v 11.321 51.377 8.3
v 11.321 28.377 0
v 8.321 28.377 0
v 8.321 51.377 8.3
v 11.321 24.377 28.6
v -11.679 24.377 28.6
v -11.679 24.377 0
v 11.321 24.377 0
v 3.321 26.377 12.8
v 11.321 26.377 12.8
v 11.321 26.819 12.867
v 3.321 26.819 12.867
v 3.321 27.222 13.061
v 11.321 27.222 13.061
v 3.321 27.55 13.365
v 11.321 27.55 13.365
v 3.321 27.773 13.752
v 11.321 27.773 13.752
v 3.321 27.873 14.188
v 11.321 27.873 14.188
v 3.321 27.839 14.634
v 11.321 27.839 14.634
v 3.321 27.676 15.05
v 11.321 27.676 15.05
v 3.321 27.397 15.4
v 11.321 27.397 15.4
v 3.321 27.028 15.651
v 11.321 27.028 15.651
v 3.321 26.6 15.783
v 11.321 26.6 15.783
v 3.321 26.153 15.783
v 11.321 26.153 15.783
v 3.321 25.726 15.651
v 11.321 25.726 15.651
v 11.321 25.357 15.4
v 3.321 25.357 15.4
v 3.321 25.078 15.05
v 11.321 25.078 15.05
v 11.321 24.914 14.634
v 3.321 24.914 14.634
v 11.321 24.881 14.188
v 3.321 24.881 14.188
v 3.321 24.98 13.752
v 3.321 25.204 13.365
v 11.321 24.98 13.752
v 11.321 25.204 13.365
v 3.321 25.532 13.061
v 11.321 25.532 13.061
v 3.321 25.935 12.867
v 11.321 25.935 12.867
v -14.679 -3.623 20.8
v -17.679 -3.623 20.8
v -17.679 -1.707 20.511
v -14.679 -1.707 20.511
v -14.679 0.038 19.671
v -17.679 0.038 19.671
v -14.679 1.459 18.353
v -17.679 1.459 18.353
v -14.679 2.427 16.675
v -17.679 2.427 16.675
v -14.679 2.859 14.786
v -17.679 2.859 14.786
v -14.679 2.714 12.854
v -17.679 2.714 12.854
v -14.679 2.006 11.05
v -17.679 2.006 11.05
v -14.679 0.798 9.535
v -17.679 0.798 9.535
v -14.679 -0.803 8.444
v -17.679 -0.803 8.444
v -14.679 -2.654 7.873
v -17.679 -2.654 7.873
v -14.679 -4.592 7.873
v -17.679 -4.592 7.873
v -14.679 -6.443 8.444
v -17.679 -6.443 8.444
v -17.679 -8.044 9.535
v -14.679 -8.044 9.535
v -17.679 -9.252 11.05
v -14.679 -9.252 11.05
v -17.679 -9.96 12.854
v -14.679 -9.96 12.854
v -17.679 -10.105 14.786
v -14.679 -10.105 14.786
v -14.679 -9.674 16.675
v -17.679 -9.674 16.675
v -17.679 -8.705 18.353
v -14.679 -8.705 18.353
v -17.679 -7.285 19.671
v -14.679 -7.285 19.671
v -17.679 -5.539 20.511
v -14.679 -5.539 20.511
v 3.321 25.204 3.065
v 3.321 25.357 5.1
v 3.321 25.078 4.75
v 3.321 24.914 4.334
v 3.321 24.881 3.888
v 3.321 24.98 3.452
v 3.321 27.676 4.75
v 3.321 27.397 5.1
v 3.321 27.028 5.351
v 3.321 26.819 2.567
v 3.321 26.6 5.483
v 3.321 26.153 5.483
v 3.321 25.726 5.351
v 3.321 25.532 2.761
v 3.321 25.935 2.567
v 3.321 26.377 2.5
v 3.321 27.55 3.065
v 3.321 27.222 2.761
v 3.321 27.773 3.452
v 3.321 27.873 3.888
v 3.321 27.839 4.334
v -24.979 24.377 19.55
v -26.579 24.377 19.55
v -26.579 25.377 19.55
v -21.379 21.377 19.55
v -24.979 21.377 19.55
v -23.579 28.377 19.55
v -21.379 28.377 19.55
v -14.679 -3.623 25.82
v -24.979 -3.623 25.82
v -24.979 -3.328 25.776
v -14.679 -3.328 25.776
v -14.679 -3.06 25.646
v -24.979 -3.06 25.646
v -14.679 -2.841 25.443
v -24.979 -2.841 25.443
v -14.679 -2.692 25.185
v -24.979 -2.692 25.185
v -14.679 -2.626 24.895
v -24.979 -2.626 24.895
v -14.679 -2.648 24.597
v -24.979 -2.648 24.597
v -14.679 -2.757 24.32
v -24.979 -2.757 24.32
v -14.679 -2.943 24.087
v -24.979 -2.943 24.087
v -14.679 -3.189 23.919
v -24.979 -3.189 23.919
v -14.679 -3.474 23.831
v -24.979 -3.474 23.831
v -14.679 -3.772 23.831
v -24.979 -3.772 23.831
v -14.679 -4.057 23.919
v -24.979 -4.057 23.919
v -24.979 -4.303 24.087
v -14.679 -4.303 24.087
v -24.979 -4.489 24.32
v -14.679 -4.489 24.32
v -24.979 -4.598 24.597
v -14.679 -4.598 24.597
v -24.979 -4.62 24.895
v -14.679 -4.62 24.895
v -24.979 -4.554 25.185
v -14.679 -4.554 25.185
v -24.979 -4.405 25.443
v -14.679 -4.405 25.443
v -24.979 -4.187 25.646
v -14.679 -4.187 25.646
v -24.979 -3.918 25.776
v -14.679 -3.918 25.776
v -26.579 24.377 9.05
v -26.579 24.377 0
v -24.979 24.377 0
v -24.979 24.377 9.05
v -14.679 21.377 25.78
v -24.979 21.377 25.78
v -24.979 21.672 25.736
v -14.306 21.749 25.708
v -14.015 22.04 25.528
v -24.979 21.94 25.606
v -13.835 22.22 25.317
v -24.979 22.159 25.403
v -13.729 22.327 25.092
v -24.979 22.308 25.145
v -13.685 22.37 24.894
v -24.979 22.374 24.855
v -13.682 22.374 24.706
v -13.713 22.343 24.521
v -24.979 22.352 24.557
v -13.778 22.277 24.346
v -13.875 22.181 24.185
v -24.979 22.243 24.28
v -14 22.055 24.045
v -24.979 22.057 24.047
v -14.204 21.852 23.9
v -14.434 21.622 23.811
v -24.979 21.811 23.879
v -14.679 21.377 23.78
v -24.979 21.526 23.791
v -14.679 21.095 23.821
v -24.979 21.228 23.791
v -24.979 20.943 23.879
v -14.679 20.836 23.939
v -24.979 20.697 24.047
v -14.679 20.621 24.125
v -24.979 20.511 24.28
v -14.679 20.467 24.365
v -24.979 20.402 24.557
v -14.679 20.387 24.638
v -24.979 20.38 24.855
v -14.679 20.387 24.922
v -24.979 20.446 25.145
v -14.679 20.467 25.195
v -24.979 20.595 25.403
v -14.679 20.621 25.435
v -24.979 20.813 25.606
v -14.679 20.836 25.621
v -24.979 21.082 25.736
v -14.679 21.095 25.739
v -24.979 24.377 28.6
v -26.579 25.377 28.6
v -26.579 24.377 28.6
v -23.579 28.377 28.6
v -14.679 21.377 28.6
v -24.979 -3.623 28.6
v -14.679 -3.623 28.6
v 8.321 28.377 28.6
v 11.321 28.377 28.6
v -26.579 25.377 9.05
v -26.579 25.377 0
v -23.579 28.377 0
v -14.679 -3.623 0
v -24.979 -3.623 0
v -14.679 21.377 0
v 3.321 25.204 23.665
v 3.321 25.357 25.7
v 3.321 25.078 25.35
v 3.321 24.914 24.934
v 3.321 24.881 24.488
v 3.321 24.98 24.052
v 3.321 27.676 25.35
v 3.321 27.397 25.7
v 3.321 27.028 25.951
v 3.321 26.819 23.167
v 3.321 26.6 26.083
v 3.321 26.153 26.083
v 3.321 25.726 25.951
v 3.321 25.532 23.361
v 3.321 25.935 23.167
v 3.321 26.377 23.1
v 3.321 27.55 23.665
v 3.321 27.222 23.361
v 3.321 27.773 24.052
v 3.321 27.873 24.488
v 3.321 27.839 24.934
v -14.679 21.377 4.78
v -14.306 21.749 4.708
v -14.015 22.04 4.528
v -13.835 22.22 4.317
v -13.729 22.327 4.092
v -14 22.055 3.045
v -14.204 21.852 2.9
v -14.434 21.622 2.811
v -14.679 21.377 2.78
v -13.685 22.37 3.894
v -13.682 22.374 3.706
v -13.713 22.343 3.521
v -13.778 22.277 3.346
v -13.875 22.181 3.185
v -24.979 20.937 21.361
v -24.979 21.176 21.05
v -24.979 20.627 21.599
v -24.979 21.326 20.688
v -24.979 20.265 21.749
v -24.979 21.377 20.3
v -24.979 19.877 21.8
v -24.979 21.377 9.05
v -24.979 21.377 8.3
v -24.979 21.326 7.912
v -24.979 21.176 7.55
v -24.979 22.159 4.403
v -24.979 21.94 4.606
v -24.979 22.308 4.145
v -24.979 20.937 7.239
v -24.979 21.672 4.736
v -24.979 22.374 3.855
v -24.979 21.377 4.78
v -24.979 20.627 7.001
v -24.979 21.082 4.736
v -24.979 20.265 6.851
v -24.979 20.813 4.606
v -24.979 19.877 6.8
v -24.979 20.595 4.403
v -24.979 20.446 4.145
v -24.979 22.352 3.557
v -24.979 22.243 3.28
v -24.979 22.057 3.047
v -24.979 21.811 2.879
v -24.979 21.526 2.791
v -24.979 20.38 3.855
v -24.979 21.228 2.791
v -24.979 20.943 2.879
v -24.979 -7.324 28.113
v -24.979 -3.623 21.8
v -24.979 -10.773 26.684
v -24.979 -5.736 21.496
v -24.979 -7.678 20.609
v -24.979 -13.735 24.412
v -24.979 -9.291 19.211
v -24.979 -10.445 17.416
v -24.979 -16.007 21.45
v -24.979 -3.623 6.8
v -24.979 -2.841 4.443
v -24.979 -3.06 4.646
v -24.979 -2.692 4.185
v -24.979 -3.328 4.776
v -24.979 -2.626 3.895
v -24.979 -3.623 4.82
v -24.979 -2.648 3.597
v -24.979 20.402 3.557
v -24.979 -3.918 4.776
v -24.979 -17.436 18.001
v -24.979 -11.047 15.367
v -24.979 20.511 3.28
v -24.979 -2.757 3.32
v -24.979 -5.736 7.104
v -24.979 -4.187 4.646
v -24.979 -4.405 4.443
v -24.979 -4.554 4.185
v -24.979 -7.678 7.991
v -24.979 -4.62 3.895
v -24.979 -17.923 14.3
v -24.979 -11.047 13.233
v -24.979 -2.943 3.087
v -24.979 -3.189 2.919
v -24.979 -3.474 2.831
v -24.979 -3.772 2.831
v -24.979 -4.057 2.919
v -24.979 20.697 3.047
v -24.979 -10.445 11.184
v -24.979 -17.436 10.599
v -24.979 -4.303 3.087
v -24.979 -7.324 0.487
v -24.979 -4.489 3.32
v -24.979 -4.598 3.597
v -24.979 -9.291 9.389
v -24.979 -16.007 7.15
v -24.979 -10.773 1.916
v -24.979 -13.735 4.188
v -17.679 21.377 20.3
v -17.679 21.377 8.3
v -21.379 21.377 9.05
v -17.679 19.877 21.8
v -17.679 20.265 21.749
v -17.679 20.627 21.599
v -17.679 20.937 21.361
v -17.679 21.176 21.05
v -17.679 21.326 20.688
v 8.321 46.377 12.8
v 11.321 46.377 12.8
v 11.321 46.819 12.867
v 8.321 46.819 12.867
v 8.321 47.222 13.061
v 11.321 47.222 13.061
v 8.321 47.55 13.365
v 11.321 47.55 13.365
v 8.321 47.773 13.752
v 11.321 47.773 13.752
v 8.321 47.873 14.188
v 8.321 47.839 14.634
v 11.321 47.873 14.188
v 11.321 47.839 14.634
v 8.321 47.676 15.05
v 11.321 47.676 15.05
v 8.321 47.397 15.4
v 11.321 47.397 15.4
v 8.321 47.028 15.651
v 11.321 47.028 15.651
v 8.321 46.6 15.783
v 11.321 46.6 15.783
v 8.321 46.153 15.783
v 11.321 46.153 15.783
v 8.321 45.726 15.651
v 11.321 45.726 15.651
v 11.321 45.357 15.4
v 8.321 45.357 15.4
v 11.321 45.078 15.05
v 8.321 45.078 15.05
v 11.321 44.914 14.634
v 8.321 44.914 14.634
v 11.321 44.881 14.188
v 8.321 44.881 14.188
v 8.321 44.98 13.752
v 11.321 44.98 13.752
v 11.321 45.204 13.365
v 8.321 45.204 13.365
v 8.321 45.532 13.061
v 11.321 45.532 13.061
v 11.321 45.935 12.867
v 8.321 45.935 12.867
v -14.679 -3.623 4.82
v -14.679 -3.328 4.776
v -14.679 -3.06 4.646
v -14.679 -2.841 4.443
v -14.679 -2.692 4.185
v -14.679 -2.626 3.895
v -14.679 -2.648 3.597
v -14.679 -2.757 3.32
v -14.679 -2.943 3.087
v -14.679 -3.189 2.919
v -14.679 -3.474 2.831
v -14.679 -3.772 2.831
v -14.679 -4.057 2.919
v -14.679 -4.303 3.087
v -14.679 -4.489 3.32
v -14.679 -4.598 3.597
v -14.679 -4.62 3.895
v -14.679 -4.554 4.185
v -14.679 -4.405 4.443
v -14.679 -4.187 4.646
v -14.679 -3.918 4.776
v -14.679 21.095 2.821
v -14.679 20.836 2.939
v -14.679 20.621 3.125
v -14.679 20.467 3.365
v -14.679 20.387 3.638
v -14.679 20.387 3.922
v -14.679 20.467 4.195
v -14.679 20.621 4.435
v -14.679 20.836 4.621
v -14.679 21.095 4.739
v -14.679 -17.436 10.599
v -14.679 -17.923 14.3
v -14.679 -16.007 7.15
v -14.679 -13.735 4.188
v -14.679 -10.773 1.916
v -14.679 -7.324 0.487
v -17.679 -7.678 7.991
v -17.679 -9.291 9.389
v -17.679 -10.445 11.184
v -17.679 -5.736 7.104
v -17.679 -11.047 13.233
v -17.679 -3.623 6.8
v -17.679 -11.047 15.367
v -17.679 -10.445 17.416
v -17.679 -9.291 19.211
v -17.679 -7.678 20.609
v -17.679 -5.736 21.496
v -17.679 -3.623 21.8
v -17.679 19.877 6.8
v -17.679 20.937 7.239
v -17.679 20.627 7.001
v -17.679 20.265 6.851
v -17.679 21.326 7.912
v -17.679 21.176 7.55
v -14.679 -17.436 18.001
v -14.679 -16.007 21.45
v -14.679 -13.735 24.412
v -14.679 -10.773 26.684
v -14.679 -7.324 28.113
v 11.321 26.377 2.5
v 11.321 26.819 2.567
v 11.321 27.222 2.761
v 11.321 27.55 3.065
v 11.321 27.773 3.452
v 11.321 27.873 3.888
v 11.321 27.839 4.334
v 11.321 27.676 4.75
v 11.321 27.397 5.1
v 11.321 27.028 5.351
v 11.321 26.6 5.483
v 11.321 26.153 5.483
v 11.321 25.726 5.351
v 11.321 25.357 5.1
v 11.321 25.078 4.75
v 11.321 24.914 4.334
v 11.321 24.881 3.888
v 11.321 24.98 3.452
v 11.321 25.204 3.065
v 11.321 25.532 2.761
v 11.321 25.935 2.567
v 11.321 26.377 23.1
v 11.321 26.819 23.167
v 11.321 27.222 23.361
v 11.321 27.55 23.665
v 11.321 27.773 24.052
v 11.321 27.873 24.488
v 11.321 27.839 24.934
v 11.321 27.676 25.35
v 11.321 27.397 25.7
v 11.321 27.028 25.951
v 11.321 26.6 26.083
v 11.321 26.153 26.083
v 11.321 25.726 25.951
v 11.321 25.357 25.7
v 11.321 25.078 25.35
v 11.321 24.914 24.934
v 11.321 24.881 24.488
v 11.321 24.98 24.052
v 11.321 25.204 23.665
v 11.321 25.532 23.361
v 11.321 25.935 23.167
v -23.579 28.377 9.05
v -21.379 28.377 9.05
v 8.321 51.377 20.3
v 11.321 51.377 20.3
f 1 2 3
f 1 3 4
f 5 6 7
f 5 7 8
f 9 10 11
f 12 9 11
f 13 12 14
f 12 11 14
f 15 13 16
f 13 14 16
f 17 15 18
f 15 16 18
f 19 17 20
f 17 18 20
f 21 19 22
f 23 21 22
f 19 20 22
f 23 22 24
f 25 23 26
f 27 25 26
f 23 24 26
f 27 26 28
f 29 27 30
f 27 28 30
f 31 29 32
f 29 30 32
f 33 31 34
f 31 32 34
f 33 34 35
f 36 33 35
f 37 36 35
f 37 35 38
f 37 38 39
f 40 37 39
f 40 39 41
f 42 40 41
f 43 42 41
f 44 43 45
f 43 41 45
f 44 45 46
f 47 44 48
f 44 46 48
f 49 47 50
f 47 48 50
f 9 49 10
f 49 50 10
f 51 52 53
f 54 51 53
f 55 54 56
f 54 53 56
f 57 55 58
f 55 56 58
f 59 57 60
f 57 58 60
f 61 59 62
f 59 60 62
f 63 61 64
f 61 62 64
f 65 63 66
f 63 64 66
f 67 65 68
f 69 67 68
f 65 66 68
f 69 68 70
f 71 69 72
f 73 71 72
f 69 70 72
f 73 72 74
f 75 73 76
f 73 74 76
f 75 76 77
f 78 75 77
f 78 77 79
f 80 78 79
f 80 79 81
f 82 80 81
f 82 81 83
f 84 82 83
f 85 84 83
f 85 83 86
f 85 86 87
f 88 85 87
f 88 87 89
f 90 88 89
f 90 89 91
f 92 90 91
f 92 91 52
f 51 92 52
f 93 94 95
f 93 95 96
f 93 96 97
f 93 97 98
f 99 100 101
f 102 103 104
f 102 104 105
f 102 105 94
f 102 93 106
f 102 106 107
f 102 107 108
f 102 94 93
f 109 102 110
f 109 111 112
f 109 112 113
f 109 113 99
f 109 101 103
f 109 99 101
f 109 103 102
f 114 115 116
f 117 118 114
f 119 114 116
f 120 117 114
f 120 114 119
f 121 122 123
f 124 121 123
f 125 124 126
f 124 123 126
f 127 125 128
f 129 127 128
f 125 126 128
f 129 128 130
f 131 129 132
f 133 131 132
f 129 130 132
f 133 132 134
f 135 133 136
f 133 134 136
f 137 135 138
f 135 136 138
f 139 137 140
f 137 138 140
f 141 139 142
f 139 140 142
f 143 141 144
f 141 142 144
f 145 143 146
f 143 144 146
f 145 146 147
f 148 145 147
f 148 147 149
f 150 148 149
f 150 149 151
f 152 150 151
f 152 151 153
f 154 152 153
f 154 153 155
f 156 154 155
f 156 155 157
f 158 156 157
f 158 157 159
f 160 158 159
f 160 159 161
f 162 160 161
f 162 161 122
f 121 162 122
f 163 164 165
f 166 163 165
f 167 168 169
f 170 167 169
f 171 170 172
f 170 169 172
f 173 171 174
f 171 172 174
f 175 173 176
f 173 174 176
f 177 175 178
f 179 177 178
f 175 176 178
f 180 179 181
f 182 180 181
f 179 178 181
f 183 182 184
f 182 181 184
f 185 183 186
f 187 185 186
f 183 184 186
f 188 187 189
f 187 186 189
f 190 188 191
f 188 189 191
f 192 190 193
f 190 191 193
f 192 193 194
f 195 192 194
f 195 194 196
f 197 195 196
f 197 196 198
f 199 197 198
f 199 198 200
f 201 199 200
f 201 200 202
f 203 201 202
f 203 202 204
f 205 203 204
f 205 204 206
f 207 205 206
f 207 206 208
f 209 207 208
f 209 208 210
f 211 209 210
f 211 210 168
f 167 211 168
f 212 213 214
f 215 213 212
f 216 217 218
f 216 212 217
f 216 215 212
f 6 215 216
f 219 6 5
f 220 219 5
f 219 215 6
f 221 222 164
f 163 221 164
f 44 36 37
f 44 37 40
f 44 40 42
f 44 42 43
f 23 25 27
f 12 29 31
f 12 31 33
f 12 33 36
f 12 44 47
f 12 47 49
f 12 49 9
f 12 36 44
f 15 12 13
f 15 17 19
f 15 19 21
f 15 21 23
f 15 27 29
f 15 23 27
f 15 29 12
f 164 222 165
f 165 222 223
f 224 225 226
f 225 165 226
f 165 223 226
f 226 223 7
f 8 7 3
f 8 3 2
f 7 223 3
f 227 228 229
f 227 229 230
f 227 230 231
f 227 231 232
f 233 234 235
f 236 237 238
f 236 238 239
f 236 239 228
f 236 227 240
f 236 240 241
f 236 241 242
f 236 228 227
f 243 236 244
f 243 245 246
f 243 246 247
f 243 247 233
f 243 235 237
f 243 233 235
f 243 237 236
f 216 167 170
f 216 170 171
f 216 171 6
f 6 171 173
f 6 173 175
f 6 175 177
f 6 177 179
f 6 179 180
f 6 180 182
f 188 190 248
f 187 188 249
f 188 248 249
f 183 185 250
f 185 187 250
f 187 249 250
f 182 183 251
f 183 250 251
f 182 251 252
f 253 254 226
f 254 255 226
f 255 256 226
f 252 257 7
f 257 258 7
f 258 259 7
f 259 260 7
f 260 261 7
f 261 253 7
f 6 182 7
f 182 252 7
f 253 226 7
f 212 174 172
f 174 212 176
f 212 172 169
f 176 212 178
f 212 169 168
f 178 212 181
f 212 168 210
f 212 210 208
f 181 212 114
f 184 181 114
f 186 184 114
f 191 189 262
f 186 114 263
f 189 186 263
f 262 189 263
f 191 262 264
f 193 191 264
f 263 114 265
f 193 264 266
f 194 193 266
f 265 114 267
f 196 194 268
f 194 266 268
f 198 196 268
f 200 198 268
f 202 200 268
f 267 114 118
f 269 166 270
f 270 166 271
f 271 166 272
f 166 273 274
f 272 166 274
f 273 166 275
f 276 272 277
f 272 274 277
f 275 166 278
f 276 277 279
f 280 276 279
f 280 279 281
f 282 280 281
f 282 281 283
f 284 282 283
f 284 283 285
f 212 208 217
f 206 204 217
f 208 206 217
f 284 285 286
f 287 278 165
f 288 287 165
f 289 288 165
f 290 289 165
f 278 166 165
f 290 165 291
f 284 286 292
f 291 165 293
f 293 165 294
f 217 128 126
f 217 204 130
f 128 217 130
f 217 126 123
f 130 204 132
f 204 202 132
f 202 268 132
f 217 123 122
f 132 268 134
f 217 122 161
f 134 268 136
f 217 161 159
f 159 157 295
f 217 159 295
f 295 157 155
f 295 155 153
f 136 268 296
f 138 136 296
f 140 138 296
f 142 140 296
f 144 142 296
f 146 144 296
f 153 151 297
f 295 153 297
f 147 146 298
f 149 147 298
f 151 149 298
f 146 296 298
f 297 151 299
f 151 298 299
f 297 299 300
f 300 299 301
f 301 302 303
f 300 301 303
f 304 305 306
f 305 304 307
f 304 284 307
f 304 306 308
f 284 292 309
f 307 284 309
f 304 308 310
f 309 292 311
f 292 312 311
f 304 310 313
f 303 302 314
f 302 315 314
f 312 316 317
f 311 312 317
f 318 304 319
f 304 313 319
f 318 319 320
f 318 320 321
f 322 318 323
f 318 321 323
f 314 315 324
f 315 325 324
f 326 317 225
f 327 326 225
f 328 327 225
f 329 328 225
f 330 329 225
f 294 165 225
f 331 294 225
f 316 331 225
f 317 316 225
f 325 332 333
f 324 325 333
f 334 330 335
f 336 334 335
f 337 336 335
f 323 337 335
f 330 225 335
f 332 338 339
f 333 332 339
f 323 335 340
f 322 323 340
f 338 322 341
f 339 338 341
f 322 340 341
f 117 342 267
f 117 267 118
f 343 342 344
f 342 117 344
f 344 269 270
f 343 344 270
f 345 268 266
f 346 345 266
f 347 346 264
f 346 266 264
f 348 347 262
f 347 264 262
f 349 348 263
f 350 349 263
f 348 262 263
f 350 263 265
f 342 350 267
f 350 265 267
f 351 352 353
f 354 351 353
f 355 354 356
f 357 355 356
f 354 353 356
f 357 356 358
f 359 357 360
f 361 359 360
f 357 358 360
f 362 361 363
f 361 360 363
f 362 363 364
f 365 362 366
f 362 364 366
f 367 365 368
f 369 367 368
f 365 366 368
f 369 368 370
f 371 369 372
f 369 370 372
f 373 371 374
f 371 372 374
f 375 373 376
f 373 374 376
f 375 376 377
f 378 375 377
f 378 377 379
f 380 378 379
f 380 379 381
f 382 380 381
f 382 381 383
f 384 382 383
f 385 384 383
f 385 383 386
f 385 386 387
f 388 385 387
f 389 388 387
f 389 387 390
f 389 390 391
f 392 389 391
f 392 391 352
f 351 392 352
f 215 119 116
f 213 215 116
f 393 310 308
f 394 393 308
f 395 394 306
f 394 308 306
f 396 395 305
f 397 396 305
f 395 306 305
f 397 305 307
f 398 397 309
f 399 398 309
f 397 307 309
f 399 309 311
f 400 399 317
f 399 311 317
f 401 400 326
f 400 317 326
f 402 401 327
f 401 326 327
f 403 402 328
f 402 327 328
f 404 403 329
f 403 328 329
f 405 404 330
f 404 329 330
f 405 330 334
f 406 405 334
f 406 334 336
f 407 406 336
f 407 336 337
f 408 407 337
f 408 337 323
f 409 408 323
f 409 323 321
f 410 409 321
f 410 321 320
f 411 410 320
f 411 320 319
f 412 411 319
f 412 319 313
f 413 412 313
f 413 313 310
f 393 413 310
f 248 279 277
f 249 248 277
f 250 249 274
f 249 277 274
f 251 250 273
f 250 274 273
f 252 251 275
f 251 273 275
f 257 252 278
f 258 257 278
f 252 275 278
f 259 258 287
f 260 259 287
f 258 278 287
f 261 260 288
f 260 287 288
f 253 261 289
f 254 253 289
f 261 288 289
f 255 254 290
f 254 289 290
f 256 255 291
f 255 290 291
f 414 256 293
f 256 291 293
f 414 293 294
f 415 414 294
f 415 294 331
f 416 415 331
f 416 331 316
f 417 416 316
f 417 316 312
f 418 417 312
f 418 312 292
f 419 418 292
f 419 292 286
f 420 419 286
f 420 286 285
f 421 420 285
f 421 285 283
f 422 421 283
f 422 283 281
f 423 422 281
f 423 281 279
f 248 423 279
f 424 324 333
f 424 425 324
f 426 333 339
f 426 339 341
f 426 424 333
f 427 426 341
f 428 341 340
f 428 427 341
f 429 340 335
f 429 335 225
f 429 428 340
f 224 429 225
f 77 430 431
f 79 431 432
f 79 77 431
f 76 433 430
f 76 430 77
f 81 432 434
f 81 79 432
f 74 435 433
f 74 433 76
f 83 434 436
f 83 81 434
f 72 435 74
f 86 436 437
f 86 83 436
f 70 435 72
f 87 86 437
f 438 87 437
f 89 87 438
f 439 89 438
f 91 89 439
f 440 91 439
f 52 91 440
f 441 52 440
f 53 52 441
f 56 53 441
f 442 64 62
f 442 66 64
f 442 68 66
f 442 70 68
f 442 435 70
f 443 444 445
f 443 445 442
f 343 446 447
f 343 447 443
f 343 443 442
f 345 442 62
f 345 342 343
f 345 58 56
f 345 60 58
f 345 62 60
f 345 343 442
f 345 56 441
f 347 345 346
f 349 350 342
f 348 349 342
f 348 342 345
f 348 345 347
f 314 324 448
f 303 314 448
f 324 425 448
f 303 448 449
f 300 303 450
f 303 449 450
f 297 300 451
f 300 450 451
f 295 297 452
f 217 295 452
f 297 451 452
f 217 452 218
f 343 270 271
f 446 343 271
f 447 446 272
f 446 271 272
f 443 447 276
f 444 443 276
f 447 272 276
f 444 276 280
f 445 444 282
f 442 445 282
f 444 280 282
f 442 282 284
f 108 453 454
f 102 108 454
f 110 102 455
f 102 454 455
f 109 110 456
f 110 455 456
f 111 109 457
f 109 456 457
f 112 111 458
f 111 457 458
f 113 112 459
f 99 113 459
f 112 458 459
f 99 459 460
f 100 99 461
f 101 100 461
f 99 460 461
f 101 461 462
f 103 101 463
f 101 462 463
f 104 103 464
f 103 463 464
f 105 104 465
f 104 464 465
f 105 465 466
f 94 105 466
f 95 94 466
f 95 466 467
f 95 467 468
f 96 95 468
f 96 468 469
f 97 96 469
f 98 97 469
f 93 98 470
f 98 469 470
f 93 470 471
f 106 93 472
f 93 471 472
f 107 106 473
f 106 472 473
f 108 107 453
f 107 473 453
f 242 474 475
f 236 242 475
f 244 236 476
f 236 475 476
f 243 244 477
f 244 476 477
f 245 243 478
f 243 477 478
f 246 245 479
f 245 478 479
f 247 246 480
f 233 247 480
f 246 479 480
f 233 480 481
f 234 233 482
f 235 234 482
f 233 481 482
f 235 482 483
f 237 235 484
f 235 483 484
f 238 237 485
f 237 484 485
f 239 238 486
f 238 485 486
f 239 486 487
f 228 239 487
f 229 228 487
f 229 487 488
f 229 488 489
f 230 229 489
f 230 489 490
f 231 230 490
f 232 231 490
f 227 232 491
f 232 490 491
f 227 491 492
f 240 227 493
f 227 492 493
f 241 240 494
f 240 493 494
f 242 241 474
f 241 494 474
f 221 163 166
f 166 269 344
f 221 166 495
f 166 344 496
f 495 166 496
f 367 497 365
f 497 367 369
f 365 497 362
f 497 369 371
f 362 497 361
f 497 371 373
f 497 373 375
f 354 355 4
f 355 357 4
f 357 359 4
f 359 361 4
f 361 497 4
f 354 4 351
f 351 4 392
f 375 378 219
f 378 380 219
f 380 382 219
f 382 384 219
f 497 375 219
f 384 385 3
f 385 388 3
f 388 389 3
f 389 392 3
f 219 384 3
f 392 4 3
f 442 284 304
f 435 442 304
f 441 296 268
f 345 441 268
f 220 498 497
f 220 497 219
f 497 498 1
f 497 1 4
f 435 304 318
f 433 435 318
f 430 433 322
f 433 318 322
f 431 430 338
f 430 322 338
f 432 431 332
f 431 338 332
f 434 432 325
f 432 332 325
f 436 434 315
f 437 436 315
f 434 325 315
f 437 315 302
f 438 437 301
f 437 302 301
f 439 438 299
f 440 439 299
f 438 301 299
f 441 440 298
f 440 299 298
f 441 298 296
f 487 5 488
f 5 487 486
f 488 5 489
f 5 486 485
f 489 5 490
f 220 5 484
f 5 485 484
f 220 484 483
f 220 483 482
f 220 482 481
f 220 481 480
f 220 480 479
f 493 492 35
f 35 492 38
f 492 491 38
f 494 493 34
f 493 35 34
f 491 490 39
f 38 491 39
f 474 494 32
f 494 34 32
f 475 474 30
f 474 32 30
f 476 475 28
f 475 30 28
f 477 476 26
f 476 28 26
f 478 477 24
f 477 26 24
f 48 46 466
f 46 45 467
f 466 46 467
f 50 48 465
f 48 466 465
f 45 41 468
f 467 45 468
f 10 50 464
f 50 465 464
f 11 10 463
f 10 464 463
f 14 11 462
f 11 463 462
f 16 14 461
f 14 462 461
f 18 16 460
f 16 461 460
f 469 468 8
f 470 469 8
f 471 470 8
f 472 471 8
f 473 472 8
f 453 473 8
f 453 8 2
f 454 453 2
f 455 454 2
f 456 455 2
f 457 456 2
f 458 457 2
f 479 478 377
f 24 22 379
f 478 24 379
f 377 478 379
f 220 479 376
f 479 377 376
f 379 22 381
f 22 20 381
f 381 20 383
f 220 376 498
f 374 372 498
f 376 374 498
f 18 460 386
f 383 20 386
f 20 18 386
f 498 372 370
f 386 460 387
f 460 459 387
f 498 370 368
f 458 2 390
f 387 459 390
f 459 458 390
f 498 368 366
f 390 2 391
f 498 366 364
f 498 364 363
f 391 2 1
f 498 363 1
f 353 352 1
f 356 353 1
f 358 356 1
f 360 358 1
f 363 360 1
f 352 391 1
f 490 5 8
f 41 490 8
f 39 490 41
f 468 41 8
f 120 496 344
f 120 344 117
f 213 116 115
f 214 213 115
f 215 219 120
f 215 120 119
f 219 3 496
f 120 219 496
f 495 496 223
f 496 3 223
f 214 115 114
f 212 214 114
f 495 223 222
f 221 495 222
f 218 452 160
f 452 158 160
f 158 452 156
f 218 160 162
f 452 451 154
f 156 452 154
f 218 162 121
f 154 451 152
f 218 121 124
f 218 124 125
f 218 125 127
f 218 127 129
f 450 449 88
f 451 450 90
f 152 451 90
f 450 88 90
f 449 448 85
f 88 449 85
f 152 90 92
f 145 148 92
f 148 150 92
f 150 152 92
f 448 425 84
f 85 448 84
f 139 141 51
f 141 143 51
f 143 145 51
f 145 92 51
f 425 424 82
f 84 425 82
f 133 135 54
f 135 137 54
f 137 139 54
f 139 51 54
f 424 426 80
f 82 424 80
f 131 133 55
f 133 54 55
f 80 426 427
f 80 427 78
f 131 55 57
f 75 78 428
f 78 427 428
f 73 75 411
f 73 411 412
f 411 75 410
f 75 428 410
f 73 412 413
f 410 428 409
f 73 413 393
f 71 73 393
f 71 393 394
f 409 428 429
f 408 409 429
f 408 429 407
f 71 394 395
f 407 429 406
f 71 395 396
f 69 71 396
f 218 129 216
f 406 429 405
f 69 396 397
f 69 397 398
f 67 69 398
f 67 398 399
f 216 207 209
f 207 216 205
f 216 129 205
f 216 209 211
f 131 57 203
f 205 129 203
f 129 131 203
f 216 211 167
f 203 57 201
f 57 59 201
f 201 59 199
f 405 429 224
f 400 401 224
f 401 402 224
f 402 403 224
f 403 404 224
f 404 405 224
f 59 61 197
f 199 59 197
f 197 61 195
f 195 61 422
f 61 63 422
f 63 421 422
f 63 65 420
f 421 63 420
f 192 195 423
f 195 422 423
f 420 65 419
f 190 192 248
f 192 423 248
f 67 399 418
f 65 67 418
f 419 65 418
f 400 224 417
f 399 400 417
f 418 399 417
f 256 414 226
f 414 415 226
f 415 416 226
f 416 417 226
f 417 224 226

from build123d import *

# Parameters (mm, degrees)
EXTRUDE_1_DEPTH          = 28.6
SKETCH_2_R               = 1
CUT_EXTRUDE_1_DEPTH      = 28.6
FILLET_1_R               = 14.3
CUT_EXTRUDE_2_DEPTH      = 7.3
CUT_EXTRUDE_4_DEPTH      = 19.6
CUT_EXTRUDE_4_DEPTH_BACK = 3.6
SKETCH_4_W               = 10.5
SKETCH_4_H               = 22.266748583
SKETCH_5_R               = 6.5
CUT_EXTRUDE_5_DEPTH      = 3.6
CUT_EXTRUDE_6_DEPTH      = 22.6
SKETCH_7_R               = 1.5
CUT_EXTRUDE_7_DEPTH      = 8


with BuildPart() as part:
    # Model → 凸台-拉伸1 (new body)
    with BuildSketch(Plane.XY):
        Polygon((-24.978787879, -17.92321671), (-14.678787879, -17.92321671), (-14.678787879, 21.376794113), (-11.678787879, 24.376794113), (11.321212121, 24.376794113), (11.321212121, 51.376794114), (8.321212121, 51.376794114), (8.321212121, 28.376794114), (-23.578787879, 28.376794114), (-26.578787879, 25.376794114), (-26.578787879, 24.376794113), (-24.978787879, 24.376794113), align=None)
    extrude(amount=EXTRUDE_1_DEPTH)

    # 草图2 → 切除-拉伸1 (cut)
    with BuildSketch(Plane.ZY.offset(24.978787879)):
        with Locations((3.78, 21.376794113)):
            Circle(SKETCH_2_R)
        with Locations((24.78, 21.376794113)):
            Circle(SKETCH_2_R)
        with Locations((24.82, -3.623205887)):
            Circle(SKETCH_2_R)
        with Locations((3.82, -3.623205887)):
            Circle(SKETCH_2_R)
    extrude(amount=-CUT_EXTRUDE_1_DEPTH, mode=Mode.SUBTRACT)

    # 圆角1
    fillet_1_edges = [part.edges().sort_by_distance(p)[0] for p in [
        (-19.828787879, -17.92321671, 28.6),
        (-19.828787879, -17.92321671, 0),
    ]]
    fillet(fillet_1_edges, radius=FILLET_1_R - 0.0001)  # a hair under: the kernel refuses the full size

    # 草图3 → 切除-拉伸2 (cut)
    with BuildSketch(Plane.ZY.offset(24.978787879)):
        with BuildLine():
            Line((21.8, -3.62321671), (21.8, 19.87678329))
            ThreePointArc((21.8, 19.87678329), (21.360660172, 20.937443461), (20.3, 21.37678329))
            Line((20.3, 21.37678329), (8.3, 21.37678329))
            ThreePointArc((8.3, 21.37678329), (7.239339828, 20.937443461), (6.8, 19.87678329))
            Line((6.8, 19.87678329), (6.8, -3.62321671))
            ThreePointArc((6.8, -3.62321671), (14.3, -11.12321671), (21.8, -3.62321671))
        make_face()
    extrude(amount=-CUT_EXTRUDE_2_DEPTH, mode=Mode.SUBTRACT)

    # 草图4 → 切除-拉伸4 (cut, two sides: drawn at the far end of the back side and taken through both)
    with BuildSketch(Plane.ZY.offset(24.978787879).offset(-CUT_EXTRUDE_4_DEPTH_BACK)):
        with Locations((14.3, 25.815793082)):
            Rectangle(SKETCH_4_W, SKETCH_4_H)
    extrude(amount=CUT_EXTRUDE_4_DEPTH + CUT_EXTRUDE_4_DEPTH_BACK, mode=Mode.SUBTRACT)

    # 草图5 → 切除-拉伸5 (cut)
    with BuildSketch(Plane.ZY.offset(17.678787879)):
        with Locations((14.3, -3.62321671)):
            Circle(SKETCH_5_R)
    extrude(amount=-CUT_EXTRUDE_5_DEPTH, mode=Mode.SUBTRACT)

    # 草图6 → 切除-拉伸6 (cut)
    with BuildSketch(Plane(origin=(11.321212121, 0, 0), x_dir=(0, 0, -1), z_dir=(1, 0, 0))):
        Polygon((0, 28.376794114), (-8.3, 51.376794114), (5.727876299, 54.90154804), align=None)
        Polygon((-20.3, 51.376794114), (-28.6, 28.376794114), (-35.26481715, 54.90154804), align=None)
    extrude(amount=-CUT_EXTRUDE_6_DEPTH, mode=Mode.SUBTRACT)

    # 草图7 → 切除-拉伸7 (cut)
    with BuildSketch(Plane(origin=(11.321212121, 0, 0), x_dir=(0, 0, -1), z_dir=(1, 0, 0))):
        with Locations((-14.3, 46.376794114)):
            Circle(SKETCH_7_R)
        with Locations((-24.6, 26.376794113)):
            Circle(SKETCH_7_R)
        with Locations((-14.3, 26.376794113)):
            Circle(SKETCH_7_R)
        with Locations((-4, 26.376794113)):
            Circle(SKETCH_7_R)
    extrude(amount=-CUT_EXTRUDE_7_DEPTH, mode=Mode.SUBTRACT)


solid = part.part
